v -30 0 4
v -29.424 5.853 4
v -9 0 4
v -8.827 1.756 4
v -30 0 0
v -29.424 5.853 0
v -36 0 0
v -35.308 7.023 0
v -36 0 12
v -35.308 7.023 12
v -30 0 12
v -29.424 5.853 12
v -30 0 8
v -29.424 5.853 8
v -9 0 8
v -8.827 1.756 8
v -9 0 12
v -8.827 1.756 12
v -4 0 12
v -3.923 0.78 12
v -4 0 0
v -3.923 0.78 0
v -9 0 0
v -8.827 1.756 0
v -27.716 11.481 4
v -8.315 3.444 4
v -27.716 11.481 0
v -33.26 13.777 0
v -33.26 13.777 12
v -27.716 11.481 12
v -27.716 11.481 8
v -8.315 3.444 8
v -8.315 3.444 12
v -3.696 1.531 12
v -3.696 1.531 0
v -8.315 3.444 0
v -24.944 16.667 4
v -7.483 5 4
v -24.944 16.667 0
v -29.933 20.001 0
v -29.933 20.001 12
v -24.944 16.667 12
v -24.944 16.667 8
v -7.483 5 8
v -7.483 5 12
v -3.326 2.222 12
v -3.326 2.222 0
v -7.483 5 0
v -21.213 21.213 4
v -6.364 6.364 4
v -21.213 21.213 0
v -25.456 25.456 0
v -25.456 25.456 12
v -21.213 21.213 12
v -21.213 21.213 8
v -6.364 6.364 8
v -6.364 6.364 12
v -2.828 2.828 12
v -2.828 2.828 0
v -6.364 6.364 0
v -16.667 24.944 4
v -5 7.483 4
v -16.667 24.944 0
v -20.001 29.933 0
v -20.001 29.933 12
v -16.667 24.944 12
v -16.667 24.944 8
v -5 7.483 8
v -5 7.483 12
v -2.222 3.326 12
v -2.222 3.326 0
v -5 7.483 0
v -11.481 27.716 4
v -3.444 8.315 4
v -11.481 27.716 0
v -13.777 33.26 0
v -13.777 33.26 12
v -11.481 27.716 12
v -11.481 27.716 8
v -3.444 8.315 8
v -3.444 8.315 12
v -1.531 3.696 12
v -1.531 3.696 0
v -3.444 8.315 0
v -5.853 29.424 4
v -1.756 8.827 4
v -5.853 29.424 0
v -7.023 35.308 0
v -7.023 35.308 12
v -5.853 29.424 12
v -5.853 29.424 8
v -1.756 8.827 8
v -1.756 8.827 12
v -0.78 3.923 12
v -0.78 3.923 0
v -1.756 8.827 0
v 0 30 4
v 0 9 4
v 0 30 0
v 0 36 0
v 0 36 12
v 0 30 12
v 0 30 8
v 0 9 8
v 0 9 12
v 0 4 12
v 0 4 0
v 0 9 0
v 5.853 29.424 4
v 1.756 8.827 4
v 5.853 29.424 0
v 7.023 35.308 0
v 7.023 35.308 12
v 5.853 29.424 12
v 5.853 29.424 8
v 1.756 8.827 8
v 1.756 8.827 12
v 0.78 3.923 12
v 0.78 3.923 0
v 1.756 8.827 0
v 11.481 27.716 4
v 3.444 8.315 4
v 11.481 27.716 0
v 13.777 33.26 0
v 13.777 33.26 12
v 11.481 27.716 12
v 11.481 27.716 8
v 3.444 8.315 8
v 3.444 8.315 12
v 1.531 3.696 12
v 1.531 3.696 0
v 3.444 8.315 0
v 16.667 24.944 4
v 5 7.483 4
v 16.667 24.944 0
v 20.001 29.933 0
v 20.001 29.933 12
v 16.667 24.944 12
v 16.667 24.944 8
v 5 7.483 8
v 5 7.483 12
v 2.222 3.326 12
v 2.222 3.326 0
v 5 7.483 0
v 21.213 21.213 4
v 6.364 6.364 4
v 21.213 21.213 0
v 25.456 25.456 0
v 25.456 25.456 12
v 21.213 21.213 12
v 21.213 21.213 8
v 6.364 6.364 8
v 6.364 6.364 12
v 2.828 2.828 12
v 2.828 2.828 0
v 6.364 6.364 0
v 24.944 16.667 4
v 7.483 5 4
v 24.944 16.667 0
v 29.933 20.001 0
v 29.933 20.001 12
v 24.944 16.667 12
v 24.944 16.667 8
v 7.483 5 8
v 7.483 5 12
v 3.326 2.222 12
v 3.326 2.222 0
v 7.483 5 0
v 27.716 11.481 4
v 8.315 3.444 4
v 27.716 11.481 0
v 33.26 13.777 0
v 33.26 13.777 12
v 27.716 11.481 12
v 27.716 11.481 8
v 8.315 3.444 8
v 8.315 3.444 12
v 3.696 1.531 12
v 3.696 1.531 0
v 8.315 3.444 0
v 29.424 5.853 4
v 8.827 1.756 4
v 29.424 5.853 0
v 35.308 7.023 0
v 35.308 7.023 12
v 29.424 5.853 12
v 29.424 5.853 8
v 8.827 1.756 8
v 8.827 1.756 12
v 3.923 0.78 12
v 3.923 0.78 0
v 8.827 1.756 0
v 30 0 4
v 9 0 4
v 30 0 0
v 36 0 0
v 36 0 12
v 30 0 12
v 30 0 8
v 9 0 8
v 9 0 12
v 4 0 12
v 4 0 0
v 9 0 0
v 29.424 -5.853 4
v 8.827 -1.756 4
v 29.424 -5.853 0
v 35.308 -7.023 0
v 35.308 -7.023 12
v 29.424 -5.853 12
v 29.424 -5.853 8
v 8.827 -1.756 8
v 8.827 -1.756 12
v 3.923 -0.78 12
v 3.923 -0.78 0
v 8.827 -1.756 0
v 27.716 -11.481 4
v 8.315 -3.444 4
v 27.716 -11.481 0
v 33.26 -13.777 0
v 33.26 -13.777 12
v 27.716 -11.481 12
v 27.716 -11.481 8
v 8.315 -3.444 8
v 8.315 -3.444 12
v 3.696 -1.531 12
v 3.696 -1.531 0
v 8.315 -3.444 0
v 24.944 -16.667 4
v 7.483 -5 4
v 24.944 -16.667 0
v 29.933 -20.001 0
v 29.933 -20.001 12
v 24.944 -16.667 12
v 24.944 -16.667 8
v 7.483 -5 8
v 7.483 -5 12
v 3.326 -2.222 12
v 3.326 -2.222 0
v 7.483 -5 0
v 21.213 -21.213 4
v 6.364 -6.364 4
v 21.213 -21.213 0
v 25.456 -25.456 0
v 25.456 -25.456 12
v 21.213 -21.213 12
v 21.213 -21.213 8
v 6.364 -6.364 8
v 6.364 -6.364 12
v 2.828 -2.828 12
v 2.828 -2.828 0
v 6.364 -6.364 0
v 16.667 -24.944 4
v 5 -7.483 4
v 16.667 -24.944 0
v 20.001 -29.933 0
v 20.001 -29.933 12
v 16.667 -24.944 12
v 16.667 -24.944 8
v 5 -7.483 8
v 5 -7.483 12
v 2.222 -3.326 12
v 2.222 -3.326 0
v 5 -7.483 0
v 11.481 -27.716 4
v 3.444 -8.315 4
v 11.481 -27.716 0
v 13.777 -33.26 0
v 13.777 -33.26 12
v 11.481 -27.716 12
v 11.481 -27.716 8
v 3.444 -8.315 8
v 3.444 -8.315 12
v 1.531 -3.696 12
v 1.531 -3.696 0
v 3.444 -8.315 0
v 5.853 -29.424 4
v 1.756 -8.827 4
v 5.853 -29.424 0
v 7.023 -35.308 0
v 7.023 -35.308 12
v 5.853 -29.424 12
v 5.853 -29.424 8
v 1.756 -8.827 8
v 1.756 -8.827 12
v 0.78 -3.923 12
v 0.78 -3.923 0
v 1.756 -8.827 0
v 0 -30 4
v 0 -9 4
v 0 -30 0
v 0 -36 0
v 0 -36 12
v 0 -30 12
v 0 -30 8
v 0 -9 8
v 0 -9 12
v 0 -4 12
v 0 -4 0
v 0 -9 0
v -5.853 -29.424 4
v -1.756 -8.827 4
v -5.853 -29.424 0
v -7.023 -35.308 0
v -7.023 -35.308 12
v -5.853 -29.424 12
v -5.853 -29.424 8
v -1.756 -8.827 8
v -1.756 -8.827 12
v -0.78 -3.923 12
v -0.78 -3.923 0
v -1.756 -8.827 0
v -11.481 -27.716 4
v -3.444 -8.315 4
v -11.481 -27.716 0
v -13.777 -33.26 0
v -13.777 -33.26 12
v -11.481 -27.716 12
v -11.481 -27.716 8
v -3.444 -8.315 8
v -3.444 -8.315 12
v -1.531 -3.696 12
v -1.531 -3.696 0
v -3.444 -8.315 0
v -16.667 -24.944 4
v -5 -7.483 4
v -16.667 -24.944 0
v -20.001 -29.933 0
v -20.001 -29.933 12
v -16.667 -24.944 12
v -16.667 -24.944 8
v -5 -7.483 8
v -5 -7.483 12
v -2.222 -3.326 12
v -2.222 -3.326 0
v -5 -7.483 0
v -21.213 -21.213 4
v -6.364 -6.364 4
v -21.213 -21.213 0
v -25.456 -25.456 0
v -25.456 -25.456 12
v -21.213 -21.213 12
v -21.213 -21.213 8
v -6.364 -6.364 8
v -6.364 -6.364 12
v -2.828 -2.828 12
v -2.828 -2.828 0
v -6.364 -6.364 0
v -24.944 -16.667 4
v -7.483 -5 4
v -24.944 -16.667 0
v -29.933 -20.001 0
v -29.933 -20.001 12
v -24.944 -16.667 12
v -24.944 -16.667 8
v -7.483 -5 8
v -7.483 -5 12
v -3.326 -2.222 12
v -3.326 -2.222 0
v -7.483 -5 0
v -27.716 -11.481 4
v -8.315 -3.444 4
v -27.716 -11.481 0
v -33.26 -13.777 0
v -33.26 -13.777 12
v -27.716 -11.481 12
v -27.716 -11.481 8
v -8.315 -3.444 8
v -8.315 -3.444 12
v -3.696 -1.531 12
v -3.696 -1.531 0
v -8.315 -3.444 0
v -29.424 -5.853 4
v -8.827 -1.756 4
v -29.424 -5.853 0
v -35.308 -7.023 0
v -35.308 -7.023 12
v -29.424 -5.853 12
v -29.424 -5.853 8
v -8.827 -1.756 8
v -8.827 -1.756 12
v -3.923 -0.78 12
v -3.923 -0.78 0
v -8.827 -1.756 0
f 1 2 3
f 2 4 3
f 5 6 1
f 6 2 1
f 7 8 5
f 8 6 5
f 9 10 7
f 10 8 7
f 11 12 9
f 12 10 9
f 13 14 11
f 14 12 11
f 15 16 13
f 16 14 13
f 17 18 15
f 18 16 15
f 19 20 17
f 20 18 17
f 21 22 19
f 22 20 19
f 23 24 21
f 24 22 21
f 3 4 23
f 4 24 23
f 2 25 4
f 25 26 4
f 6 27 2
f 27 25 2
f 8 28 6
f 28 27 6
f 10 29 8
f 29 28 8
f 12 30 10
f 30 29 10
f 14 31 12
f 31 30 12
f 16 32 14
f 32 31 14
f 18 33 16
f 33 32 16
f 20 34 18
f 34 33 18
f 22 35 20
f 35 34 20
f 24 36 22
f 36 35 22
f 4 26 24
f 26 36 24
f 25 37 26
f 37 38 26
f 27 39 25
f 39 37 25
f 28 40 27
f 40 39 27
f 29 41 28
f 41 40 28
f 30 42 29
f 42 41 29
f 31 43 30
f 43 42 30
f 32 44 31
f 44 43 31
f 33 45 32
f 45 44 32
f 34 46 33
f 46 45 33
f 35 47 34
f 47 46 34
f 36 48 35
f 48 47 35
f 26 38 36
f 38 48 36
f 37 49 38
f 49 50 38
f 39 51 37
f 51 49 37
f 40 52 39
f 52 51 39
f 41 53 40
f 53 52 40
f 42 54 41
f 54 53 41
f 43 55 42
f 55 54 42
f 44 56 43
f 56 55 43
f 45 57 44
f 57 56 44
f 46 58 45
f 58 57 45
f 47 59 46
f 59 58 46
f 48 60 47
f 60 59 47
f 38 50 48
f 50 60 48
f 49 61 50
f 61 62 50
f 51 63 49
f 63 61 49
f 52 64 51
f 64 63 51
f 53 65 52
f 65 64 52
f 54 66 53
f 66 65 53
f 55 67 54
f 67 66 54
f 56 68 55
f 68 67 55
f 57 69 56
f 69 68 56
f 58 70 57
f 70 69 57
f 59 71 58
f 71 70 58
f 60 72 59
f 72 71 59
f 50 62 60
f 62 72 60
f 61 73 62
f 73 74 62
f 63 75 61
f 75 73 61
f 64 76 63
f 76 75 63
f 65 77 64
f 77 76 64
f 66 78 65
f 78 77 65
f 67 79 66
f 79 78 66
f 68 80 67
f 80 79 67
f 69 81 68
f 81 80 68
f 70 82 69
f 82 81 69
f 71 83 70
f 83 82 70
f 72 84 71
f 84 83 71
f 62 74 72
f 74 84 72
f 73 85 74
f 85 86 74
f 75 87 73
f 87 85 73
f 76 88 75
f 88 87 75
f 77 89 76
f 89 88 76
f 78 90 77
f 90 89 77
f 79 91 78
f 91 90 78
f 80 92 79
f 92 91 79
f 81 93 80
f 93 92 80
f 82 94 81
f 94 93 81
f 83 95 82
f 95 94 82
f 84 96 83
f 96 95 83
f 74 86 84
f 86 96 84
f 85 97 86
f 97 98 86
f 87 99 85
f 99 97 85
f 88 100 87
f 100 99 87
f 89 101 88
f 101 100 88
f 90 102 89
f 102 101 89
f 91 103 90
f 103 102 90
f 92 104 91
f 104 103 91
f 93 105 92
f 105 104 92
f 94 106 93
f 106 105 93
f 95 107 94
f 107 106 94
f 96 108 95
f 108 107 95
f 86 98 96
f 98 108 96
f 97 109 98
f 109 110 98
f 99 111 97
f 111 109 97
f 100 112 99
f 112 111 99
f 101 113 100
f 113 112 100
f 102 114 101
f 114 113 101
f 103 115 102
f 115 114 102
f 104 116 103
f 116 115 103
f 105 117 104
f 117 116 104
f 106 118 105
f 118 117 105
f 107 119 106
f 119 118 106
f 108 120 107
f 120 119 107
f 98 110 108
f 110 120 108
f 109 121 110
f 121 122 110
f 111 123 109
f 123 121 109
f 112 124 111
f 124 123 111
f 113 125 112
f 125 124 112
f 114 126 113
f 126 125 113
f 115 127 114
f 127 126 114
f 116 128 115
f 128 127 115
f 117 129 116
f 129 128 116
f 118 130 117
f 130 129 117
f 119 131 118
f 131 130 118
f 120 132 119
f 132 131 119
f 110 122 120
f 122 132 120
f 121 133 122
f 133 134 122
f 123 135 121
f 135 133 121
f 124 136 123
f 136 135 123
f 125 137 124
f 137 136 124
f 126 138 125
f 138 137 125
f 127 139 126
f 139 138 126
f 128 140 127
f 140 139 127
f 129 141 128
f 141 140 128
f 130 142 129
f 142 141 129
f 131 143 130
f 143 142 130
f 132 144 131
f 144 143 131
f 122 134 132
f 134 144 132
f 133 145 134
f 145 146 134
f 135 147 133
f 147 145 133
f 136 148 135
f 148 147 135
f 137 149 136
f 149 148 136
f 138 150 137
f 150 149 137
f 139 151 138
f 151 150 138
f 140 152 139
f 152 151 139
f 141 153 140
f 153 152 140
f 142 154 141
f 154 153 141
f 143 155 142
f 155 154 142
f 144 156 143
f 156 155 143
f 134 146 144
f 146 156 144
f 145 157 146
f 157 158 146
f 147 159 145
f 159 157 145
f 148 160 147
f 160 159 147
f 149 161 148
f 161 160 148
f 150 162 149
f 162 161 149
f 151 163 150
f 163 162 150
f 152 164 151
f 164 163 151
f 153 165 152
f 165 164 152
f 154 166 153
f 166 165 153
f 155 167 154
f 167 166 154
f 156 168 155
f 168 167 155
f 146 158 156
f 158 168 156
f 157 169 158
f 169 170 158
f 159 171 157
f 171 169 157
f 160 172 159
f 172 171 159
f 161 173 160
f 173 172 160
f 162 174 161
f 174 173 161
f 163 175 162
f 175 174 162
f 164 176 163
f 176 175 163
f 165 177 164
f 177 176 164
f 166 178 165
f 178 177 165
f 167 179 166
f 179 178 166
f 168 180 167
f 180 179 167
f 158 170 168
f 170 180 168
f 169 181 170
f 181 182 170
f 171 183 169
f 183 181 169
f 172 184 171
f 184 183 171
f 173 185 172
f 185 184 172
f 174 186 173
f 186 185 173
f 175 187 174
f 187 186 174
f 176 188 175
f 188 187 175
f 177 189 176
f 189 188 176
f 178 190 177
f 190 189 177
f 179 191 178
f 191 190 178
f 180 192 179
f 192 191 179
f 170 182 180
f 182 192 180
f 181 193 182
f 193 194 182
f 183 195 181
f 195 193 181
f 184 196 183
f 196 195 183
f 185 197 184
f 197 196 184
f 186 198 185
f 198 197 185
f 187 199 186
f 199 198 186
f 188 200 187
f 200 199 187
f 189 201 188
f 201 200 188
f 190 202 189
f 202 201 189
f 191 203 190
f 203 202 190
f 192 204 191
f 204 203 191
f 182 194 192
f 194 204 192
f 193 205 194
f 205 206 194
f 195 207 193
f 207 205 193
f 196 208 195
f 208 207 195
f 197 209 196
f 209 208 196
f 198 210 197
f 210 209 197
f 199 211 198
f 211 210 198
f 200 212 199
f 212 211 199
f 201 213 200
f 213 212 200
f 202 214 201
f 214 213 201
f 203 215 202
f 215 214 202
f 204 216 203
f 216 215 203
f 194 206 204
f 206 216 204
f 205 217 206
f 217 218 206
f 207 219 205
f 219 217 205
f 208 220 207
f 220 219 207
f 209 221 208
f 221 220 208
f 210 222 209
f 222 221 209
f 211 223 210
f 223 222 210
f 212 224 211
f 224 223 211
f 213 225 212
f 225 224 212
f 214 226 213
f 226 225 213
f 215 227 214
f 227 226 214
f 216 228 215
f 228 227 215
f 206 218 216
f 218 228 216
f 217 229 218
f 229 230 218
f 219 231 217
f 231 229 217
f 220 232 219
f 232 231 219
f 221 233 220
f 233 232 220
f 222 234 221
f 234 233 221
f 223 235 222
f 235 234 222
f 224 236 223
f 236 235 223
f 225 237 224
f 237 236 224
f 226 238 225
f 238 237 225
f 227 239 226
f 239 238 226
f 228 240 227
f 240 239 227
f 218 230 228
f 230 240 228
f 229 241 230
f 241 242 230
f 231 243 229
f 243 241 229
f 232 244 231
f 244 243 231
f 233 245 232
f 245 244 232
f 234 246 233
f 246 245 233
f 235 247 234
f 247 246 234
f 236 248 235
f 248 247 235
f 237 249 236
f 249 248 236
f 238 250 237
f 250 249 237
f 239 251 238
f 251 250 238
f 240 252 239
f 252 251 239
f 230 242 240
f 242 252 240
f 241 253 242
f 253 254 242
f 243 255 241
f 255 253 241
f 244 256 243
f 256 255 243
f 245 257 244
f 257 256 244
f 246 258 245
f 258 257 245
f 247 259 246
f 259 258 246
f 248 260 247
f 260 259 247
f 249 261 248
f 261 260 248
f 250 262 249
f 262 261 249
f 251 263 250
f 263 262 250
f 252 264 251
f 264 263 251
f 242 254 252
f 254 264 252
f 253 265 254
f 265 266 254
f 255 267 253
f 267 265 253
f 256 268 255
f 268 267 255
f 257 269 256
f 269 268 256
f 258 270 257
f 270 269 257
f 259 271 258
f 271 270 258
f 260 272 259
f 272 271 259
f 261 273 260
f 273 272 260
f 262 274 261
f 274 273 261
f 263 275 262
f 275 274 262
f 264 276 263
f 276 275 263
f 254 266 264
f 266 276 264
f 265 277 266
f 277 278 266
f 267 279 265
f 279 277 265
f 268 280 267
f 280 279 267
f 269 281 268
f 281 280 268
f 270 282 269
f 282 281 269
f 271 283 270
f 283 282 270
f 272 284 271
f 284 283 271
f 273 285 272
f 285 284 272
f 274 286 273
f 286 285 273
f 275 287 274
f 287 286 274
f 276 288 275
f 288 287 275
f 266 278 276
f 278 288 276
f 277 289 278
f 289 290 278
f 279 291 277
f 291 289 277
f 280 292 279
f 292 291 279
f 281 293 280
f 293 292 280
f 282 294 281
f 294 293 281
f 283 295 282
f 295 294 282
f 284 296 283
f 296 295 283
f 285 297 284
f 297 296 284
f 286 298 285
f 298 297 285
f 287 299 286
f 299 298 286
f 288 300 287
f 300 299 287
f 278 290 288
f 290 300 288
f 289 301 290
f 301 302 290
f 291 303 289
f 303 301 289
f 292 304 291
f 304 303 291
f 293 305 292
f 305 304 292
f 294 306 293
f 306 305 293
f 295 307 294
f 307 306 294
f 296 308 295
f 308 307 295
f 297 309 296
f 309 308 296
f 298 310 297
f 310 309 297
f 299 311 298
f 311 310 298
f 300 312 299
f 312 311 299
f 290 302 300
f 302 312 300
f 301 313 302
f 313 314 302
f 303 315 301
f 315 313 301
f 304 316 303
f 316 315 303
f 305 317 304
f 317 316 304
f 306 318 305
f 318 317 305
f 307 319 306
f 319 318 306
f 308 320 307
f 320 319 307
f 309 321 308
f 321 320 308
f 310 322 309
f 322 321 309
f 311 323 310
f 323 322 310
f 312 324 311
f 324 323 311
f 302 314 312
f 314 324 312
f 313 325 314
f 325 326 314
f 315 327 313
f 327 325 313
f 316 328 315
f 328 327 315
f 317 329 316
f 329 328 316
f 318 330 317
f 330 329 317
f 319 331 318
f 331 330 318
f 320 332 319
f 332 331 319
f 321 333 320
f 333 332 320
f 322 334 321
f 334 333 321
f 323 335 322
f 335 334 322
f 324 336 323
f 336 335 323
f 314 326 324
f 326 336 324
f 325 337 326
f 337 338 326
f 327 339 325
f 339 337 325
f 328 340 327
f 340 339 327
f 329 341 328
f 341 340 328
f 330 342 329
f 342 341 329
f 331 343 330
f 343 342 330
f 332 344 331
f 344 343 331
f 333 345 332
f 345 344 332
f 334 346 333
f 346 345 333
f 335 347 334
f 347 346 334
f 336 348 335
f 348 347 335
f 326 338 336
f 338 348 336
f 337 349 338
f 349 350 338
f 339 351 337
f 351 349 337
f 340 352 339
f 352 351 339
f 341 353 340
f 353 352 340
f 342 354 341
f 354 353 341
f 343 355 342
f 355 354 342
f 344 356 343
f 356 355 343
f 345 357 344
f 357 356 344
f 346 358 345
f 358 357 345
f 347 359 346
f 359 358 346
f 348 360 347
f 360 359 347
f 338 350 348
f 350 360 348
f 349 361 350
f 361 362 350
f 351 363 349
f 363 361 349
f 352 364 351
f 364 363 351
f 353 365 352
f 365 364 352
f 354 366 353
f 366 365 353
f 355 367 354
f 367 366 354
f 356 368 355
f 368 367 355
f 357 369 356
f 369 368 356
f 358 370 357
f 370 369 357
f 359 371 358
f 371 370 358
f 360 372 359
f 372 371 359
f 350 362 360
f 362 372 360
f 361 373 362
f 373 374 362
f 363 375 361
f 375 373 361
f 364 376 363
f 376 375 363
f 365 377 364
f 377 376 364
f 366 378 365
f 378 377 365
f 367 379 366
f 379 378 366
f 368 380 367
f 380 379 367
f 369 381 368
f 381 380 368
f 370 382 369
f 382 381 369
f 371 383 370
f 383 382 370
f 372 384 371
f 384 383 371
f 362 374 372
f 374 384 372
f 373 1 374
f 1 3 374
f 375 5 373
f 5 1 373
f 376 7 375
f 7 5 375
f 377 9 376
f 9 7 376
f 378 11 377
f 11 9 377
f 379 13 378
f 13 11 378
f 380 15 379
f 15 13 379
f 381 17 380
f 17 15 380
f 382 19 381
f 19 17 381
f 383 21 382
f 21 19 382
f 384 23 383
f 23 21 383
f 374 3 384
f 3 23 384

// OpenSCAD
$fn = 32;

// ----------------------------------------------------------------------
// Revolved part: handwheel R36
// ----------------------------------------------------------------------

// --- parameters (mm) ---
bore_r = 4;               // bore radius
rim_r = 36;               // rim radius
rim_w = 6;                // rim axial width
rim_t = 12;               // rim diameter height
hub_r = 9;                // hub radius
web_t = 4;                // web thickness
revolve_angle = 360;      // revolve sweep, degrees

bore_d = 2 * bore_r;
rim_d = 2 * rim_r;
hub_d = 2 * hub_r;

profile = [[4, 0], [9, 0], [9, 4], [30, 4], [30, 0], [36, 0], [36, 12], [30, 12], [30, 8], [9, 8], [9, 12], [4, 12]];  // primary outline, 12 points, counter clockwise

// --- the one profile operation ---
rotate_extrude(angle = revolve_angle) polygon(points = profile);
